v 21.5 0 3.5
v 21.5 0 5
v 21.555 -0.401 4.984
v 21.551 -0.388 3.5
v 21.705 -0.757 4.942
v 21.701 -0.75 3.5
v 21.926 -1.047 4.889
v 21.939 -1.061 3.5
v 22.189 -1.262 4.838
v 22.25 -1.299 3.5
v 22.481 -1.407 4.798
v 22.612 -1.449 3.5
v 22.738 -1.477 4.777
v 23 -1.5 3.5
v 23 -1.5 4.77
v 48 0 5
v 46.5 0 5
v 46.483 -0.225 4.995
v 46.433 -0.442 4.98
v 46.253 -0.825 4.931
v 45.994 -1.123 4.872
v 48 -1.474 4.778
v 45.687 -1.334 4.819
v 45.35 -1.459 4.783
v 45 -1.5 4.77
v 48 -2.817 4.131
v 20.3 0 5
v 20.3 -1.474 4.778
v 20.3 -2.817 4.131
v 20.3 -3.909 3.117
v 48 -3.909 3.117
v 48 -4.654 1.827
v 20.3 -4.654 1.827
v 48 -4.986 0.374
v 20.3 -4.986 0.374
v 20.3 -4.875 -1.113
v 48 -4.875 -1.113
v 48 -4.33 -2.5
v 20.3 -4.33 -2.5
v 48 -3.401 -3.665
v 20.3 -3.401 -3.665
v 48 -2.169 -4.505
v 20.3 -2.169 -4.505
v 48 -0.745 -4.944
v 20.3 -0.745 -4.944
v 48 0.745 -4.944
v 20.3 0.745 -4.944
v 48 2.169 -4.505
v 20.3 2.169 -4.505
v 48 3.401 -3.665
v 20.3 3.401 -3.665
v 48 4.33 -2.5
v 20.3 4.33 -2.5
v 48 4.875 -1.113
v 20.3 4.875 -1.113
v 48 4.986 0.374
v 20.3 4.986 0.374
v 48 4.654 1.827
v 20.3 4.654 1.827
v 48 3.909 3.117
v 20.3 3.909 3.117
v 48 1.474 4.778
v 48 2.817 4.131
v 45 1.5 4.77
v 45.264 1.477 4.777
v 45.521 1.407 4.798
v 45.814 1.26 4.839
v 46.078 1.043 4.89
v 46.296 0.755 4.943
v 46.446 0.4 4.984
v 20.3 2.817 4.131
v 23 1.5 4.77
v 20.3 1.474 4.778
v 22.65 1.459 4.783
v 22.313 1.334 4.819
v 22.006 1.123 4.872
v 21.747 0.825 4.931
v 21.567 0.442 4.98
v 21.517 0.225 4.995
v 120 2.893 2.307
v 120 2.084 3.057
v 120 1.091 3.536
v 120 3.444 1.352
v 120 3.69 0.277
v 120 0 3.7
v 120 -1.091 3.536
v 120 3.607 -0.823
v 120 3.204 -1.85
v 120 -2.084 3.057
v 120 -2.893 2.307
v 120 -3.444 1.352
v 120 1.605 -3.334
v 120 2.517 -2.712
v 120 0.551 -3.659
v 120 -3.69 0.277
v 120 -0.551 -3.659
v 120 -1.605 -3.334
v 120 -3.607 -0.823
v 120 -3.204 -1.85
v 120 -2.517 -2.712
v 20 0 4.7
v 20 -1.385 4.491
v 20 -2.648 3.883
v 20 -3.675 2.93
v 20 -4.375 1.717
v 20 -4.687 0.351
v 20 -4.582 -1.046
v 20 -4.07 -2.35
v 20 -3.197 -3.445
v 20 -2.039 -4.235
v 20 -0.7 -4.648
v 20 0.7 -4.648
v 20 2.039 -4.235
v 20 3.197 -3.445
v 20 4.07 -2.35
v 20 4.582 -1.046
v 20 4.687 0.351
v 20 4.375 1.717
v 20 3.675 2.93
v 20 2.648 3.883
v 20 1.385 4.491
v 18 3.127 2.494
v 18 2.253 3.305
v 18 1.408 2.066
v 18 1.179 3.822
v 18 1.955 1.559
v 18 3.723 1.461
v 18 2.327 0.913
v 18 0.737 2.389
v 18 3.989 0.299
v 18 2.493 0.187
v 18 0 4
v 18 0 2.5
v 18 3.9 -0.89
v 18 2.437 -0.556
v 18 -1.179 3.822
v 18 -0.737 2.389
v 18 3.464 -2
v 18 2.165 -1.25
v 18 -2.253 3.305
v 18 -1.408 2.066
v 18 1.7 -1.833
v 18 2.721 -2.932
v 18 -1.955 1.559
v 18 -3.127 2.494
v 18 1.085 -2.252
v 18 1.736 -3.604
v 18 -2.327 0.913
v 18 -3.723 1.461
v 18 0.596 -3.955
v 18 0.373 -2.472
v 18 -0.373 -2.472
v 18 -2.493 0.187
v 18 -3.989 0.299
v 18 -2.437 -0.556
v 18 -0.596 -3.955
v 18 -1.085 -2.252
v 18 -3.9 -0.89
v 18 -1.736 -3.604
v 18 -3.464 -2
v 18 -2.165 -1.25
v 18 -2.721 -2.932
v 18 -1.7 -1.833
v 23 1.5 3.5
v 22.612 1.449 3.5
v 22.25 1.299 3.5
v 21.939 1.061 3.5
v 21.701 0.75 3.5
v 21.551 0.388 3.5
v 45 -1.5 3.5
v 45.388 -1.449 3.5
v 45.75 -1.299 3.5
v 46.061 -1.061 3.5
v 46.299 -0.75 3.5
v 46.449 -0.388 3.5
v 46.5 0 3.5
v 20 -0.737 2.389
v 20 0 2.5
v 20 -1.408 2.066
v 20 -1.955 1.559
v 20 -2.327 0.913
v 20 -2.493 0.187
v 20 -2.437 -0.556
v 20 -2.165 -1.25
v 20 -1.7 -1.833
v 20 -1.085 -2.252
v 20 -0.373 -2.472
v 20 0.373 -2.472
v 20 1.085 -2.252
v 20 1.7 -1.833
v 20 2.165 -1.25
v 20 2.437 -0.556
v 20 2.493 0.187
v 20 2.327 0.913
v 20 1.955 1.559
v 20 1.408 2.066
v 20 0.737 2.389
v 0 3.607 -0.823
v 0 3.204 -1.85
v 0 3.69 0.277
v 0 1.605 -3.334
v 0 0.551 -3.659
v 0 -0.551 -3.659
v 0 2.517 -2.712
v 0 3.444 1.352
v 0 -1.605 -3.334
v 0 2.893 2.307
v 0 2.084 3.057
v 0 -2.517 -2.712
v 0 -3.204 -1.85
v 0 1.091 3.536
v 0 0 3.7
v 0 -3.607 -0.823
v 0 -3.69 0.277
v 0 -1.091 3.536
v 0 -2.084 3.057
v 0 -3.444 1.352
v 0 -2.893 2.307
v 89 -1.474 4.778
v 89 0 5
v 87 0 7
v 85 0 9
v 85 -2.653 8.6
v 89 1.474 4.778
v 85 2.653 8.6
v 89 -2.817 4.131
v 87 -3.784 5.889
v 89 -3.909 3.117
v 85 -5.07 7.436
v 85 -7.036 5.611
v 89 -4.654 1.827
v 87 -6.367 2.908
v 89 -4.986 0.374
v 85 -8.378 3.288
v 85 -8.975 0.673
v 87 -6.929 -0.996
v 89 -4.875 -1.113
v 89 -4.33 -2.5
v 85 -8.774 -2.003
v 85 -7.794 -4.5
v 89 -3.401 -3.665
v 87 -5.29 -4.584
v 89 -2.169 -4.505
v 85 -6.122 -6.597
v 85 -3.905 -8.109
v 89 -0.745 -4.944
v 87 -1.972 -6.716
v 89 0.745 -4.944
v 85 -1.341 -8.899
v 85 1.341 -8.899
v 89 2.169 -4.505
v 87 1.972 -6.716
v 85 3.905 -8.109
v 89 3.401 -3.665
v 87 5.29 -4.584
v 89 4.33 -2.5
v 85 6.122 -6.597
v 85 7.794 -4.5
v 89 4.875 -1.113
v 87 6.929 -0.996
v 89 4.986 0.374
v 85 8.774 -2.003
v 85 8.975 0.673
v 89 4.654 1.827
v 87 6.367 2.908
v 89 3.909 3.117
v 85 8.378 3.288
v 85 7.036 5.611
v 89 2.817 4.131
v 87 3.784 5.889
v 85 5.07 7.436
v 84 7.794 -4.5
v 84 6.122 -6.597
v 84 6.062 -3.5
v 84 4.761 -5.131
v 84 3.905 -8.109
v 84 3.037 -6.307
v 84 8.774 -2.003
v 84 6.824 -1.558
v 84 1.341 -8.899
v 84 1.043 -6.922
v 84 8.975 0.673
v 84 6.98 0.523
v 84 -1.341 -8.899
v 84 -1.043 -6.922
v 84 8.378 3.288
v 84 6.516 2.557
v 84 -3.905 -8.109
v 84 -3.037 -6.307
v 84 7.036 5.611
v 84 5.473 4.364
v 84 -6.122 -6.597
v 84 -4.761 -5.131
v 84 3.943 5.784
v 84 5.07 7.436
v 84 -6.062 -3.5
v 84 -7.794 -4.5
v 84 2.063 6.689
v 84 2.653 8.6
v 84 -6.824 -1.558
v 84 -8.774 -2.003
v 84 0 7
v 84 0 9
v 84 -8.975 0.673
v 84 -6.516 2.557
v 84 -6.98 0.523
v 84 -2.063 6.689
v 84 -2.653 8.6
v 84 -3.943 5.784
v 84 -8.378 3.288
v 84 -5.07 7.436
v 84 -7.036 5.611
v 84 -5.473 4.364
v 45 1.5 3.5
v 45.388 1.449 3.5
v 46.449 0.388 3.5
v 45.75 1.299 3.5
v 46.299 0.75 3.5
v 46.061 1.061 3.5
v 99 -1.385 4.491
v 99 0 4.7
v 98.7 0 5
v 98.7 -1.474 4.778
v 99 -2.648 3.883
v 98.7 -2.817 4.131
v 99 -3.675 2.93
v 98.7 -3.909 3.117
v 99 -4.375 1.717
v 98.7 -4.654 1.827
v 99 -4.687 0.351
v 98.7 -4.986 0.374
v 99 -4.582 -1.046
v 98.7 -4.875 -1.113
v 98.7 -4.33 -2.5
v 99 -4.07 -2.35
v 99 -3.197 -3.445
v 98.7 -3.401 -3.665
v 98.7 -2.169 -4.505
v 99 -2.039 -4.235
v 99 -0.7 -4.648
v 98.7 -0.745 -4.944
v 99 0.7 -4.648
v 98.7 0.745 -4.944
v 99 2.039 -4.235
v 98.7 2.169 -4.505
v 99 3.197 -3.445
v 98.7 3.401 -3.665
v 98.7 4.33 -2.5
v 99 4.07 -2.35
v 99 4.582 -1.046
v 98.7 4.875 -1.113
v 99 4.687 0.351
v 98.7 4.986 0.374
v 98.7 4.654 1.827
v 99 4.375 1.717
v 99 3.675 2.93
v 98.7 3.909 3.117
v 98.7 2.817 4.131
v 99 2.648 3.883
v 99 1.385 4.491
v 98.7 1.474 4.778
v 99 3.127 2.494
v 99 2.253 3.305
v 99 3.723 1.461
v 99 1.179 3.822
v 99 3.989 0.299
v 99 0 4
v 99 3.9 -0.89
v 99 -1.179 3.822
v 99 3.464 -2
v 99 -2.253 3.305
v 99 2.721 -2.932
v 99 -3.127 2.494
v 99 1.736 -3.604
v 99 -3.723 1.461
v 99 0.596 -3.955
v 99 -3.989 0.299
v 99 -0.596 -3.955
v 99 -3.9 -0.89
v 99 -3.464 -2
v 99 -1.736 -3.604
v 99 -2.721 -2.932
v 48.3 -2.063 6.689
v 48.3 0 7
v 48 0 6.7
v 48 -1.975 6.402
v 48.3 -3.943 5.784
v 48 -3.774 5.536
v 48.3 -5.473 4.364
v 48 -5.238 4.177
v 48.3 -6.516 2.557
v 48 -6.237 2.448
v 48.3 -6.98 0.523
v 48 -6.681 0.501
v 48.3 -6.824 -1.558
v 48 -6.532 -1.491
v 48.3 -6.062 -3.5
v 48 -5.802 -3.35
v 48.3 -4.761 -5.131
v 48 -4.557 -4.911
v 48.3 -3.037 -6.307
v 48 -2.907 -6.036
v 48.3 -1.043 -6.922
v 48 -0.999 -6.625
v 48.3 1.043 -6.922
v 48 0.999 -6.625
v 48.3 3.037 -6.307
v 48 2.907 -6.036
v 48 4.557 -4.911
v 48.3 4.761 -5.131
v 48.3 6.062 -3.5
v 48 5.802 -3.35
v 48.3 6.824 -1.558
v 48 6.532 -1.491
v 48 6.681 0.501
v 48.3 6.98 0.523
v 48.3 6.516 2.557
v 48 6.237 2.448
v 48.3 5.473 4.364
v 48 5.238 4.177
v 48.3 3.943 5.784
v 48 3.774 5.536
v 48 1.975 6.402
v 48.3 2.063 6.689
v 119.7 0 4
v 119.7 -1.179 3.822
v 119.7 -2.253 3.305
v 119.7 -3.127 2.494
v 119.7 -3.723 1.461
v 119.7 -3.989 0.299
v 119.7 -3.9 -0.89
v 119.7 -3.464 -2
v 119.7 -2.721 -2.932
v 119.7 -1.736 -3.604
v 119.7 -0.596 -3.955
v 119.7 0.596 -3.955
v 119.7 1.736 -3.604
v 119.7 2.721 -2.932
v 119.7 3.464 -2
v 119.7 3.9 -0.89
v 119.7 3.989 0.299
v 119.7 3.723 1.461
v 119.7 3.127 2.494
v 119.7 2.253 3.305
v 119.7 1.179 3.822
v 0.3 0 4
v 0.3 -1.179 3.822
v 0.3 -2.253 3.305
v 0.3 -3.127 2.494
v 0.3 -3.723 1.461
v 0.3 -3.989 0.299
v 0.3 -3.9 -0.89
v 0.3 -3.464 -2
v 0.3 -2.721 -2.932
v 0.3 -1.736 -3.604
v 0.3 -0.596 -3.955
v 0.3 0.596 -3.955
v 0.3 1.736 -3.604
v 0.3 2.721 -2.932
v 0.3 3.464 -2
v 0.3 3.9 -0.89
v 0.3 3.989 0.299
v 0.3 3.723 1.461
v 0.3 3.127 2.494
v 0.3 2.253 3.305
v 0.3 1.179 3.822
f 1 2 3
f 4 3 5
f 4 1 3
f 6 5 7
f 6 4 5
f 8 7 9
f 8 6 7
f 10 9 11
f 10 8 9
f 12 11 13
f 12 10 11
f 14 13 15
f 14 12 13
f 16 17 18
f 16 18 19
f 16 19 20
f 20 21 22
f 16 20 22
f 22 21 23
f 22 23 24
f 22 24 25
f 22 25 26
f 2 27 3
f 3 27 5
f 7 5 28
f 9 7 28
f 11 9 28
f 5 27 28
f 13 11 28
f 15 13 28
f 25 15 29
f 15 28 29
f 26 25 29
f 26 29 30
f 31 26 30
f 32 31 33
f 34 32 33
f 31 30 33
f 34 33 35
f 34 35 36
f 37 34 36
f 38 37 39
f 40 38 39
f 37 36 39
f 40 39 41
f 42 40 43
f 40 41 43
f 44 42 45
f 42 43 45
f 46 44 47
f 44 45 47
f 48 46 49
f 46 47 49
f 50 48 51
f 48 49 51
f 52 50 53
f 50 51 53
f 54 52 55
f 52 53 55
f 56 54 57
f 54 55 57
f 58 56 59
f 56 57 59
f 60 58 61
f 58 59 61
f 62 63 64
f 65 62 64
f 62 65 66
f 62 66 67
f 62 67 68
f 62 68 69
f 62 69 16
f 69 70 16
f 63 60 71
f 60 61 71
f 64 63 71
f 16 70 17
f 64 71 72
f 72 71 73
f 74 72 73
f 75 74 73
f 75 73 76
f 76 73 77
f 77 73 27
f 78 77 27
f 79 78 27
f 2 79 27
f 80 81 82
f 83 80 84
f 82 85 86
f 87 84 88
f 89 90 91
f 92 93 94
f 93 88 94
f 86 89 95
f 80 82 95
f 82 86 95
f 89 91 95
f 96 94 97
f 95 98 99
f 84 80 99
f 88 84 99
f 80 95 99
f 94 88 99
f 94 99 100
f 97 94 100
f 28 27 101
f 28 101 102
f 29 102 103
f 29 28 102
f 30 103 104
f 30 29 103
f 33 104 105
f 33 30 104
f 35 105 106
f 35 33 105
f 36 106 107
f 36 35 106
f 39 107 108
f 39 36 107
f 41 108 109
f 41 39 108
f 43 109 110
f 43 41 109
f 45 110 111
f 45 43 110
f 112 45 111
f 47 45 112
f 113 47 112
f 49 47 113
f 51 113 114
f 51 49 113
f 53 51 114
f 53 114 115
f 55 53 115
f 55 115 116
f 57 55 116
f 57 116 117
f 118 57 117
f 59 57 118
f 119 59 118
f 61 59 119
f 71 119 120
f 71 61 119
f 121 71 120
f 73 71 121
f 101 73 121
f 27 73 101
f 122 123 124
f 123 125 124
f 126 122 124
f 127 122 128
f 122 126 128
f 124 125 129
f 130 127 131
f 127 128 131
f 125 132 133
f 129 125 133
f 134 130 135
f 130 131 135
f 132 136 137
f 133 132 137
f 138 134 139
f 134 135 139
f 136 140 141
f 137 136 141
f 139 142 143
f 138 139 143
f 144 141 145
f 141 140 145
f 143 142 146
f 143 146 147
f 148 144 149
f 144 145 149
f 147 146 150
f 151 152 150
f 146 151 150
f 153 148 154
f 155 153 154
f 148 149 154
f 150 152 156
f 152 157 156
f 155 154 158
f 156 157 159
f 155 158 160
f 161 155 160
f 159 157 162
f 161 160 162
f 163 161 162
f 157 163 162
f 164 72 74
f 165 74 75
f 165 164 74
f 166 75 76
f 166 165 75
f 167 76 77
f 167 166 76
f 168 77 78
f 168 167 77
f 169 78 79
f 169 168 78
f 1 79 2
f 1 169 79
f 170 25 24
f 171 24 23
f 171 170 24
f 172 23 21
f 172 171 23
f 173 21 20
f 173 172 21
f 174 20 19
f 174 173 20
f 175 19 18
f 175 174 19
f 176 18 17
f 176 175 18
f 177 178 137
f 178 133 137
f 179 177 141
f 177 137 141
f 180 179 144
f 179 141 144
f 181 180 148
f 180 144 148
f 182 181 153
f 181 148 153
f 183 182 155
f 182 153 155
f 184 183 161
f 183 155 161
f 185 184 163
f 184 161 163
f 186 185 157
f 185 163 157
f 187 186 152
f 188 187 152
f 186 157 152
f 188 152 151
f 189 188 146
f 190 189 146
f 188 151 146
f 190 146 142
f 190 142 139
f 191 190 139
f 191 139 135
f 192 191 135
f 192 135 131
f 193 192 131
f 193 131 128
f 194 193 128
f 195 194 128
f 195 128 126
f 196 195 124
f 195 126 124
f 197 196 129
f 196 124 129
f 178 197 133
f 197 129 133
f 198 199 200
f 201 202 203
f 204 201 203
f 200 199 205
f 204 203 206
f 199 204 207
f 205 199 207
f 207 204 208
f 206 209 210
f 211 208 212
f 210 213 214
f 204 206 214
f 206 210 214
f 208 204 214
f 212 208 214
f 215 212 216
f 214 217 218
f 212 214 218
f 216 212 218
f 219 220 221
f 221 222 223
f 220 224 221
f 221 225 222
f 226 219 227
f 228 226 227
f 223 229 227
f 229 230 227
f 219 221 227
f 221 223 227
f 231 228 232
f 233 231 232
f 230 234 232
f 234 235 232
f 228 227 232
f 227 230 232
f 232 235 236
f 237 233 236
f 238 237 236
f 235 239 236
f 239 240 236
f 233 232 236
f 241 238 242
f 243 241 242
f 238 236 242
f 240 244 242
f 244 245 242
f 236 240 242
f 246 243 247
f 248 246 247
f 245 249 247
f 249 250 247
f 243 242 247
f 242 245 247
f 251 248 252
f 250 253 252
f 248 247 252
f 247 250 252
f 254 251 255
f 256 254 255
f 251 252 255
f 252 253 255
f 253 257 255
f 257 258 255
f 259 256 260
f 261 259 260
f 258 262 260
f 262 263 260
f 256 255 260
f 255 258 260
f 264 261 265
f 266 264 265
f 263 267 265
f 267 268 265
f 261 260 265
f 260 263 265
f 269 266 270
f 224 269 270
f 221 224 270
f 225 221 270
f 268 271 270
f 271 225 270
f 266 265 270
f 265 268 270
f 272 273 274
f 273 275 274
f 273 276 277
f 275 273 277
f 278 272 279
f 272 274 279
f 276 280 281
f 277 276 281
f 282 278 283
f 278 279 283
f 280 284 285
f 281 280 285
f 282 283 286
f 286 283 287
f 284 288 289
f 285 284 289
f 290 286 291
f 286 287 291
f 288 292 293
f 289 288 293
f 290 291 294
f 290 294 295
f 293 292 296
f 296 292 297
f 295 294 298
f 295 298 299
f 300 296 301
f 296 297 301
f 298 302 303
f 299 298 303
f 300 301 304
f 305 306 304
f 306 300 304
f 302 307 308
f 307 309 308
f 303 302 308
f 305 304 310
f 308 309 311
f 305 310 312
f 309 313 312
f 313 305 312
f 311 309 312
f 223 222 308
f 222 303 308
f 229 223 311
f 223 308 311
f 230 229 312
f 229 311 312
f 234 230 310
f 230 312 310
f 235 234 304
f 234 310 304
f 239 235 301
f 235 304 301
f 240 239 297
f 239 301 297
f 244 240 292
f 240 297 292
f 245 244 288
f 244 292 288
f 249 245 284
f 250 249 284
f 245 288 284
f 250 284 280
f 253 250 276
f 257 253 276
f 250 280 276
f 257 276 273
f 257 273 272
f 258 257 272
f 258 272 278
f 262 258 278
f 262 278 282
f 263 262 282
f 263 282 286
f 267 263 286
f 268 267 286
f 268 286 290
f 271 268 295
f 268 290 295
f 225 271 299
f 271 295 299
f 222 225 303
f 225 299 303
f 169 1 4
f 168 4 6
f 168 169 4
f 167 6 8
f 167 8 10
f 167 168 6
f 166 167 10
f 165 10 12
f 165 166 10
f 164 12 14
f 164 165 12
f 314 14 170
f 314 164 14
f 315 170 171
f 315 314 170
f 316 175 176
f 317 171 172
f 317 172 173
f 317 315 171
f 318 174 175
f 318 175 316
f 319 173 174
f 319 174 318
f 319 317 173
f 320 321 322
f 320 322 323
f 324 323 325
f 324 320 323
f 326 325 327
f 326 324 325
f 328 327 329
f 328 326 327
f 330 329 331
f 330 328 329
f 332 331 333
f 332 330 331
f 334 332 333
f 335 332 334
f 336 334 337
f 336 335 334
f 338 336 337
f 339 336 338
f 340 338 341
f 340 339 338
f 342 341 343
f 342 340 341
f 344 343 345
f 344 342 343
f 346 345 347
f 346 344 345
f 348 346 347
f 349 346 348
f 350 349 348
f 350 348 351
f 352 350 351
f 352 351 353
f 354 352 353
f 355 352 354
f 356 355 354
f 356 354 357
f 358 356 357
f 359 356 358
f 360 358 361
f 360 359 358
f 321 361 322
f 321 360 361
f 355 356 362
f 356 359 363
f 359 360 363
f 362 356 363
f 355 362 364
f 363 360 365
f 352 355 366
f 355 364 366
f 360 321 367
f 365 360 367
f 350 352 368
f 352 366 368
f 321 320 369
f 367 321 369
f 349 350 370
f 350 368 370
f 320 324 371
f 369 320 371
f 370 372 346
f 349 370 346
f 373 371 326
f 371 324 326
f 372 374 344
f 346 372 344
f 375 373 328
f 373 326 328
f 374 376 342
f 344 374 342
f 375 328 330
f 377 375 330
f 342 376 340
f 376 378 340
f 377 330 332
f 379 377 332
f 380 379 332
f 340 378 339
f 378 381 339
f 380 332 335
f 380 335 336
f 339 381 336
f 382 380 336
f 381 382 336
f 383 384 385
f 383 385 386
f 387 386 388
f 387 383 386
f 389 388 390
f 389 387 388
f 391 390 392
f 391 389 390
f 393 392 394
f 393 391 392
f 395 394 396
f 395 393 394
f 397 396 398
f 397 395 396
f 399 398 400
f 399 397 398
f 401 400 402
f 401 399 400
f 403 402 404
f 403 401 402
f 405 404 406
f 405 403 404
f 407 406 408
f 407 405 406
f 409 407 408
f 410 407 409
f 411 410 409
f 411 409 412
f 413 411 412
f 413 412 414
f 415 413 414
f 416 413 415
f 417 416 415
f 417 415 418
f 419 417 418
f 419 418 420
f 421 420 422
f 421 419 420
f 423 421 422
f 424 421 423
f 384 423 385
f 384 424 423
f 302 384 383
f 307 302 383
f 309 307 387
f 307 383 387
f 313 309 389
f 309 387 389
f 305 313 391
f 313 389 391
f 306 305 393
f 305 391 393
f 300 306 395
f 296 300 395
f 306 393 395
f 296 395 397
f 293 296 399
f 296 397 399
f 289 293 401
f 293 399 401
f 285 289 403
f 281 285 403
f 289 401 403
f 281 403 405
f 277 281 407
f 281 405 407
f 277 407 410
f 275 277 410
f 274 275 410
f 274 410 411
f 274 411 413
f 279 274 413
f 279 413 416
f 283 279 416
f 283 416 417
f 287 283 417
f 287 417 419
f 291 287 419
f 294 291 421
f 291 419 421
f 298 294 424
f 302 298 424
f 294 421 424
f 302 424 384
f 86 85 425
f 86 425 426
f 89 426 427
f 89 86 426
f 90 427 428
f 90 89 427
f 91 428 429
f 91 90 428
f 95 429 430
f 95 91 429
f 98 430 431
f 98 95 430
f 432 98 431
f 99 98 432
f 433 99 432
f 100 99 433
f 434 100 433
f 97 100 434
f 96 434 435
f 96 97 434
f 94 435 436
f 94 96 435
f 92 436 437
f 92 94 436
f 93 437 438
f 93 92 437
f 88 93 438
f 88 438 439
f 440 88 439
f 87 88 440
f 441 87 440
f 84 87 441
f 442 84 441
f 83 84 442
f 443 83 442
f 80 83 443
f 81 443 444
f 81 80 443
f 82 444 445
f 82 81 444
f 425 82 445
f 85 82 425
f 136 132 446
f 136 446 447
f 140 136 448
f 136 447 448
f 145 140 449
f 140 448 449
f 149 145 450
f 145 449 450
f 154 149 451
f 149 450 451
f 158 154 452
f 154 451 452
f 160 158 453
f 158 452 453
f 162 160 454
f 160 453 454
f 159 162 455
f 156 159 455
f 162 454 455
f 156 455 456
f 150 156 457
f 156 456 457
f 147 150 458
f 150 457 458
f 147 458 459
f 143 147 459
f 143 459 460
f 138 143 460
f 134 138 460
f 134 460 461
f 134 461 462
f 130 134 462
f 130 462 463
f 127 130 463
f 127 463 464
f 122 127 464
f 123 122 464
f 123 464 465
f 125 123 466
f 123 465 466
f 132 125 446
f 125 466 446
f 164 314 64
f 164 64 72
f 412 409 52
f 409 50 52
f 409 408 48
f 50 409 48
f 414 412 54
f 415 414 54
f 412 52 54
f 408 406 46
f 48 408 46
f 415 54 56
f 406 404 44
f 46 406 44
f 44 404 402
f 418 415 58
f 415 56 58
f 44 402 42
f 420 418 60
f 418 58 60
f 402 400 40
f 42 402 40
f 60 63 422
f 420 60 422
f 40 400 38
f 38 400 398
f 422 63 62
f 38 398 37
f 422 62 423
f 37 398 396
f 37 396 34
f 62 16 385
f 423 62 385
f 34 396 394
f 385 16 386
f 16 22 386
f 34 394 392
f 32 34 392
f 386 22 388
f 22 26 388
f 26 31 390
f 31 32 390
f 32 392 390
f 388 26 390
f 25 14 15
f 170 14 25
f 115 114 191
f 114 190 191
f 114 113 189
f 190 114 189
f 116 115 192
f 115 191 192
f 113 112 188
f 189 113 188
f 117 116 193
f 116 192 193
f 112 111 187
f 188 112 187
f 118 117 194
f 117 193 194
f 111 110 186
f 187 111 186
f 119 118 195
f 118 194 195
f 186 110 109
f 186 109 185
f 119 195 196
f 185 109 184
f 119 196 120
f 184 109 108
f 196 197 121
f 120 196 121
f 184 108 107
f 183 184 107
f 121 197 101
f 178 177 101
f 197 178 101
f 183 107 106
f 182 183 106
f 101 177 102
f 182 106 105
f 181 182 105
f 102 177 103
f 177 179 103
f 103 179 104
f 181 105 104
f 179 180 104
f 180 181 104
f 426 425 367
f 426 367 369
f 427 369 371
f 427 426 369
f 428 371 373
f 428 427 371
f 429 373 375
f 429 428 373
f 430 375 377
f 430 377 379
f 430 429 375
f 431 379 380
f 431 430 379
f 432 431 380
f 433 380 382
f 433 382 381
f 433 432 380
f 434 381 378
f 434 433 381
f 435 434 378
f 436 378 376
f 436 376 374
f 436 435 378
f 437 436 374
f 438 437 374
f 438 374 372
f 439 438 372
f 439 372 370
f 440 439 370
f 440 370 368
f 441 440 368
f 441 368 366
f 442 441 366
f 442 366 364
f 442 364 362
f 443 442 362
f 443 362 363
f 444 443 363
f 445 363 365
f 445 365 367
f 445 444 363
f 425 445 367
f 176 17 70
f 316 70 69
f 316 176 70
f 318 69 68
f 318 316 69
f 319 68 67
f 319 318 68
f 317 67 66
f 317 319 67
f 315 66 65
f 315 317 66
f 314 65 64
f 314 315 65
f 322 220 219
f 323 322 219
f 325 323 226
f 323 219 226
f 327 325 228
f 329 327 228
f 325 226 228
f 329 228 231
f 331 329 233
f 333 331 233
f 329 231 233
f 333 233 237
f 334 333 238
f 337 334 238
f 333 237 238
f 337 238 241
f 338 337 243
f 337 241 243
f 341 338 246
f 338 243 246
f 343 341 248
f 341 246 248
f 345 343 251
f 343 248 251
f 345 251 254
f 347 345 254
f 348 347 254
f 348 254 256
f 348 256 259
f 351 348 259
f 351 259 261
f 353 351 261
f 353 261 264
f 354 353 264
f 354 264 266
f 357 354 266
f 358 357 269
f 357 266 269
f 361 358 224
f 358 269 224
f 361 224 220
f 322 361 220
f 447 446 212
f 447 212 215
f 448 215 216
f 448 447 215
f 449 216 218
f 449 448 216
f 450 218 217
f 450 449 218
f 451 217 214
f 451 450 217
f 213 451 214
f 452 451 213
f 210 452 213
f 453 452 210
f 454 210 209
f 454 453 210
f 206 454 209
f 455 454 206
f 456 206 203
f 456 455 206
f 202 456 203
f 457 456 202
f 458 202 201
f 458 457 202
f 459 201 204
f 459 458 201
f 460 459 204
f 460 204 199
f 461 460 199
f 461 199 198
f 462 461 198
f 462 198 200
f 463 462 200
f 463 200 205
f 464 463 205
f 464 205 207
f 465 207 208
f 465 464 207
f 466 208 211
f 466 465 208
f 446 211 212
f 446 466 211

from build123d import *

# Parameters (mm, degrees)
F0_W     = 21
F0_H     = 4
F5_DEPTH = 1.5
F6_SIZE  = 0.3


with BuildPart() as f2:
    # F0 (on Front) → F2 (revolve)
    with BuildSketch(Plane.XZ):
        Polygon((0, 4), (0, 0), (84, 0), (84, 7), (48, 7), (48, 5), (46.5, 5), (45, 5), (23, 5), (20, 5), (20, 2.5), (18, 2.5), (18, 4), align=None)
        Polygon((84, 7), (84, 0), (99, 0), (99, 4), (99, 5), (89, 5), (85, 9), (84, 9), align=None)
        with Locations((109.5, 2)):
            Rectangle(F0_W, F0_H)
    revolve(axis=Axis((63.735422, 0, 0), (1, 0, 0)))

    # F4 (on offset) → F5 (cut, through all)
    with BuildSketch(Plane.XY.offset(3.5)):
        with BuildLine():
            Line((45.000072, 1.5), (23.000072, 1.5))
            ThreePointArc((23.000072, 1.5), (21.939412, 1.06066), (21.500072, 0))
            ThreePointArc((21.500072, 0), (21.939412, -1.06066), (23.000072, -1.5))
            Line((23.000072, -1.5), (45.000072, -1.5))
            ThreePointArc((45.000072, -1.5), (46.060732, -1.06066), (46.500072, 0))
            ThreePointArc((46.500072, 0), (46.060732, 1.06066), (45.000072, 1.5))
        make_face()
    extrude(amount=F5_DEPTH, mode=Mode.SUBTRACT)

    # F6
    f6_edges = [f2.edges().sort_by_distance(p)[0] for p in [
        (120, 0, -4),
        (99, 0, -5),
        (48, 0, -7),
        (20, 0, -5),
        (0, 0, -4),
    ]]
    chamfer(f6_edges, length=F6_SIZE)


solid = f2.part
